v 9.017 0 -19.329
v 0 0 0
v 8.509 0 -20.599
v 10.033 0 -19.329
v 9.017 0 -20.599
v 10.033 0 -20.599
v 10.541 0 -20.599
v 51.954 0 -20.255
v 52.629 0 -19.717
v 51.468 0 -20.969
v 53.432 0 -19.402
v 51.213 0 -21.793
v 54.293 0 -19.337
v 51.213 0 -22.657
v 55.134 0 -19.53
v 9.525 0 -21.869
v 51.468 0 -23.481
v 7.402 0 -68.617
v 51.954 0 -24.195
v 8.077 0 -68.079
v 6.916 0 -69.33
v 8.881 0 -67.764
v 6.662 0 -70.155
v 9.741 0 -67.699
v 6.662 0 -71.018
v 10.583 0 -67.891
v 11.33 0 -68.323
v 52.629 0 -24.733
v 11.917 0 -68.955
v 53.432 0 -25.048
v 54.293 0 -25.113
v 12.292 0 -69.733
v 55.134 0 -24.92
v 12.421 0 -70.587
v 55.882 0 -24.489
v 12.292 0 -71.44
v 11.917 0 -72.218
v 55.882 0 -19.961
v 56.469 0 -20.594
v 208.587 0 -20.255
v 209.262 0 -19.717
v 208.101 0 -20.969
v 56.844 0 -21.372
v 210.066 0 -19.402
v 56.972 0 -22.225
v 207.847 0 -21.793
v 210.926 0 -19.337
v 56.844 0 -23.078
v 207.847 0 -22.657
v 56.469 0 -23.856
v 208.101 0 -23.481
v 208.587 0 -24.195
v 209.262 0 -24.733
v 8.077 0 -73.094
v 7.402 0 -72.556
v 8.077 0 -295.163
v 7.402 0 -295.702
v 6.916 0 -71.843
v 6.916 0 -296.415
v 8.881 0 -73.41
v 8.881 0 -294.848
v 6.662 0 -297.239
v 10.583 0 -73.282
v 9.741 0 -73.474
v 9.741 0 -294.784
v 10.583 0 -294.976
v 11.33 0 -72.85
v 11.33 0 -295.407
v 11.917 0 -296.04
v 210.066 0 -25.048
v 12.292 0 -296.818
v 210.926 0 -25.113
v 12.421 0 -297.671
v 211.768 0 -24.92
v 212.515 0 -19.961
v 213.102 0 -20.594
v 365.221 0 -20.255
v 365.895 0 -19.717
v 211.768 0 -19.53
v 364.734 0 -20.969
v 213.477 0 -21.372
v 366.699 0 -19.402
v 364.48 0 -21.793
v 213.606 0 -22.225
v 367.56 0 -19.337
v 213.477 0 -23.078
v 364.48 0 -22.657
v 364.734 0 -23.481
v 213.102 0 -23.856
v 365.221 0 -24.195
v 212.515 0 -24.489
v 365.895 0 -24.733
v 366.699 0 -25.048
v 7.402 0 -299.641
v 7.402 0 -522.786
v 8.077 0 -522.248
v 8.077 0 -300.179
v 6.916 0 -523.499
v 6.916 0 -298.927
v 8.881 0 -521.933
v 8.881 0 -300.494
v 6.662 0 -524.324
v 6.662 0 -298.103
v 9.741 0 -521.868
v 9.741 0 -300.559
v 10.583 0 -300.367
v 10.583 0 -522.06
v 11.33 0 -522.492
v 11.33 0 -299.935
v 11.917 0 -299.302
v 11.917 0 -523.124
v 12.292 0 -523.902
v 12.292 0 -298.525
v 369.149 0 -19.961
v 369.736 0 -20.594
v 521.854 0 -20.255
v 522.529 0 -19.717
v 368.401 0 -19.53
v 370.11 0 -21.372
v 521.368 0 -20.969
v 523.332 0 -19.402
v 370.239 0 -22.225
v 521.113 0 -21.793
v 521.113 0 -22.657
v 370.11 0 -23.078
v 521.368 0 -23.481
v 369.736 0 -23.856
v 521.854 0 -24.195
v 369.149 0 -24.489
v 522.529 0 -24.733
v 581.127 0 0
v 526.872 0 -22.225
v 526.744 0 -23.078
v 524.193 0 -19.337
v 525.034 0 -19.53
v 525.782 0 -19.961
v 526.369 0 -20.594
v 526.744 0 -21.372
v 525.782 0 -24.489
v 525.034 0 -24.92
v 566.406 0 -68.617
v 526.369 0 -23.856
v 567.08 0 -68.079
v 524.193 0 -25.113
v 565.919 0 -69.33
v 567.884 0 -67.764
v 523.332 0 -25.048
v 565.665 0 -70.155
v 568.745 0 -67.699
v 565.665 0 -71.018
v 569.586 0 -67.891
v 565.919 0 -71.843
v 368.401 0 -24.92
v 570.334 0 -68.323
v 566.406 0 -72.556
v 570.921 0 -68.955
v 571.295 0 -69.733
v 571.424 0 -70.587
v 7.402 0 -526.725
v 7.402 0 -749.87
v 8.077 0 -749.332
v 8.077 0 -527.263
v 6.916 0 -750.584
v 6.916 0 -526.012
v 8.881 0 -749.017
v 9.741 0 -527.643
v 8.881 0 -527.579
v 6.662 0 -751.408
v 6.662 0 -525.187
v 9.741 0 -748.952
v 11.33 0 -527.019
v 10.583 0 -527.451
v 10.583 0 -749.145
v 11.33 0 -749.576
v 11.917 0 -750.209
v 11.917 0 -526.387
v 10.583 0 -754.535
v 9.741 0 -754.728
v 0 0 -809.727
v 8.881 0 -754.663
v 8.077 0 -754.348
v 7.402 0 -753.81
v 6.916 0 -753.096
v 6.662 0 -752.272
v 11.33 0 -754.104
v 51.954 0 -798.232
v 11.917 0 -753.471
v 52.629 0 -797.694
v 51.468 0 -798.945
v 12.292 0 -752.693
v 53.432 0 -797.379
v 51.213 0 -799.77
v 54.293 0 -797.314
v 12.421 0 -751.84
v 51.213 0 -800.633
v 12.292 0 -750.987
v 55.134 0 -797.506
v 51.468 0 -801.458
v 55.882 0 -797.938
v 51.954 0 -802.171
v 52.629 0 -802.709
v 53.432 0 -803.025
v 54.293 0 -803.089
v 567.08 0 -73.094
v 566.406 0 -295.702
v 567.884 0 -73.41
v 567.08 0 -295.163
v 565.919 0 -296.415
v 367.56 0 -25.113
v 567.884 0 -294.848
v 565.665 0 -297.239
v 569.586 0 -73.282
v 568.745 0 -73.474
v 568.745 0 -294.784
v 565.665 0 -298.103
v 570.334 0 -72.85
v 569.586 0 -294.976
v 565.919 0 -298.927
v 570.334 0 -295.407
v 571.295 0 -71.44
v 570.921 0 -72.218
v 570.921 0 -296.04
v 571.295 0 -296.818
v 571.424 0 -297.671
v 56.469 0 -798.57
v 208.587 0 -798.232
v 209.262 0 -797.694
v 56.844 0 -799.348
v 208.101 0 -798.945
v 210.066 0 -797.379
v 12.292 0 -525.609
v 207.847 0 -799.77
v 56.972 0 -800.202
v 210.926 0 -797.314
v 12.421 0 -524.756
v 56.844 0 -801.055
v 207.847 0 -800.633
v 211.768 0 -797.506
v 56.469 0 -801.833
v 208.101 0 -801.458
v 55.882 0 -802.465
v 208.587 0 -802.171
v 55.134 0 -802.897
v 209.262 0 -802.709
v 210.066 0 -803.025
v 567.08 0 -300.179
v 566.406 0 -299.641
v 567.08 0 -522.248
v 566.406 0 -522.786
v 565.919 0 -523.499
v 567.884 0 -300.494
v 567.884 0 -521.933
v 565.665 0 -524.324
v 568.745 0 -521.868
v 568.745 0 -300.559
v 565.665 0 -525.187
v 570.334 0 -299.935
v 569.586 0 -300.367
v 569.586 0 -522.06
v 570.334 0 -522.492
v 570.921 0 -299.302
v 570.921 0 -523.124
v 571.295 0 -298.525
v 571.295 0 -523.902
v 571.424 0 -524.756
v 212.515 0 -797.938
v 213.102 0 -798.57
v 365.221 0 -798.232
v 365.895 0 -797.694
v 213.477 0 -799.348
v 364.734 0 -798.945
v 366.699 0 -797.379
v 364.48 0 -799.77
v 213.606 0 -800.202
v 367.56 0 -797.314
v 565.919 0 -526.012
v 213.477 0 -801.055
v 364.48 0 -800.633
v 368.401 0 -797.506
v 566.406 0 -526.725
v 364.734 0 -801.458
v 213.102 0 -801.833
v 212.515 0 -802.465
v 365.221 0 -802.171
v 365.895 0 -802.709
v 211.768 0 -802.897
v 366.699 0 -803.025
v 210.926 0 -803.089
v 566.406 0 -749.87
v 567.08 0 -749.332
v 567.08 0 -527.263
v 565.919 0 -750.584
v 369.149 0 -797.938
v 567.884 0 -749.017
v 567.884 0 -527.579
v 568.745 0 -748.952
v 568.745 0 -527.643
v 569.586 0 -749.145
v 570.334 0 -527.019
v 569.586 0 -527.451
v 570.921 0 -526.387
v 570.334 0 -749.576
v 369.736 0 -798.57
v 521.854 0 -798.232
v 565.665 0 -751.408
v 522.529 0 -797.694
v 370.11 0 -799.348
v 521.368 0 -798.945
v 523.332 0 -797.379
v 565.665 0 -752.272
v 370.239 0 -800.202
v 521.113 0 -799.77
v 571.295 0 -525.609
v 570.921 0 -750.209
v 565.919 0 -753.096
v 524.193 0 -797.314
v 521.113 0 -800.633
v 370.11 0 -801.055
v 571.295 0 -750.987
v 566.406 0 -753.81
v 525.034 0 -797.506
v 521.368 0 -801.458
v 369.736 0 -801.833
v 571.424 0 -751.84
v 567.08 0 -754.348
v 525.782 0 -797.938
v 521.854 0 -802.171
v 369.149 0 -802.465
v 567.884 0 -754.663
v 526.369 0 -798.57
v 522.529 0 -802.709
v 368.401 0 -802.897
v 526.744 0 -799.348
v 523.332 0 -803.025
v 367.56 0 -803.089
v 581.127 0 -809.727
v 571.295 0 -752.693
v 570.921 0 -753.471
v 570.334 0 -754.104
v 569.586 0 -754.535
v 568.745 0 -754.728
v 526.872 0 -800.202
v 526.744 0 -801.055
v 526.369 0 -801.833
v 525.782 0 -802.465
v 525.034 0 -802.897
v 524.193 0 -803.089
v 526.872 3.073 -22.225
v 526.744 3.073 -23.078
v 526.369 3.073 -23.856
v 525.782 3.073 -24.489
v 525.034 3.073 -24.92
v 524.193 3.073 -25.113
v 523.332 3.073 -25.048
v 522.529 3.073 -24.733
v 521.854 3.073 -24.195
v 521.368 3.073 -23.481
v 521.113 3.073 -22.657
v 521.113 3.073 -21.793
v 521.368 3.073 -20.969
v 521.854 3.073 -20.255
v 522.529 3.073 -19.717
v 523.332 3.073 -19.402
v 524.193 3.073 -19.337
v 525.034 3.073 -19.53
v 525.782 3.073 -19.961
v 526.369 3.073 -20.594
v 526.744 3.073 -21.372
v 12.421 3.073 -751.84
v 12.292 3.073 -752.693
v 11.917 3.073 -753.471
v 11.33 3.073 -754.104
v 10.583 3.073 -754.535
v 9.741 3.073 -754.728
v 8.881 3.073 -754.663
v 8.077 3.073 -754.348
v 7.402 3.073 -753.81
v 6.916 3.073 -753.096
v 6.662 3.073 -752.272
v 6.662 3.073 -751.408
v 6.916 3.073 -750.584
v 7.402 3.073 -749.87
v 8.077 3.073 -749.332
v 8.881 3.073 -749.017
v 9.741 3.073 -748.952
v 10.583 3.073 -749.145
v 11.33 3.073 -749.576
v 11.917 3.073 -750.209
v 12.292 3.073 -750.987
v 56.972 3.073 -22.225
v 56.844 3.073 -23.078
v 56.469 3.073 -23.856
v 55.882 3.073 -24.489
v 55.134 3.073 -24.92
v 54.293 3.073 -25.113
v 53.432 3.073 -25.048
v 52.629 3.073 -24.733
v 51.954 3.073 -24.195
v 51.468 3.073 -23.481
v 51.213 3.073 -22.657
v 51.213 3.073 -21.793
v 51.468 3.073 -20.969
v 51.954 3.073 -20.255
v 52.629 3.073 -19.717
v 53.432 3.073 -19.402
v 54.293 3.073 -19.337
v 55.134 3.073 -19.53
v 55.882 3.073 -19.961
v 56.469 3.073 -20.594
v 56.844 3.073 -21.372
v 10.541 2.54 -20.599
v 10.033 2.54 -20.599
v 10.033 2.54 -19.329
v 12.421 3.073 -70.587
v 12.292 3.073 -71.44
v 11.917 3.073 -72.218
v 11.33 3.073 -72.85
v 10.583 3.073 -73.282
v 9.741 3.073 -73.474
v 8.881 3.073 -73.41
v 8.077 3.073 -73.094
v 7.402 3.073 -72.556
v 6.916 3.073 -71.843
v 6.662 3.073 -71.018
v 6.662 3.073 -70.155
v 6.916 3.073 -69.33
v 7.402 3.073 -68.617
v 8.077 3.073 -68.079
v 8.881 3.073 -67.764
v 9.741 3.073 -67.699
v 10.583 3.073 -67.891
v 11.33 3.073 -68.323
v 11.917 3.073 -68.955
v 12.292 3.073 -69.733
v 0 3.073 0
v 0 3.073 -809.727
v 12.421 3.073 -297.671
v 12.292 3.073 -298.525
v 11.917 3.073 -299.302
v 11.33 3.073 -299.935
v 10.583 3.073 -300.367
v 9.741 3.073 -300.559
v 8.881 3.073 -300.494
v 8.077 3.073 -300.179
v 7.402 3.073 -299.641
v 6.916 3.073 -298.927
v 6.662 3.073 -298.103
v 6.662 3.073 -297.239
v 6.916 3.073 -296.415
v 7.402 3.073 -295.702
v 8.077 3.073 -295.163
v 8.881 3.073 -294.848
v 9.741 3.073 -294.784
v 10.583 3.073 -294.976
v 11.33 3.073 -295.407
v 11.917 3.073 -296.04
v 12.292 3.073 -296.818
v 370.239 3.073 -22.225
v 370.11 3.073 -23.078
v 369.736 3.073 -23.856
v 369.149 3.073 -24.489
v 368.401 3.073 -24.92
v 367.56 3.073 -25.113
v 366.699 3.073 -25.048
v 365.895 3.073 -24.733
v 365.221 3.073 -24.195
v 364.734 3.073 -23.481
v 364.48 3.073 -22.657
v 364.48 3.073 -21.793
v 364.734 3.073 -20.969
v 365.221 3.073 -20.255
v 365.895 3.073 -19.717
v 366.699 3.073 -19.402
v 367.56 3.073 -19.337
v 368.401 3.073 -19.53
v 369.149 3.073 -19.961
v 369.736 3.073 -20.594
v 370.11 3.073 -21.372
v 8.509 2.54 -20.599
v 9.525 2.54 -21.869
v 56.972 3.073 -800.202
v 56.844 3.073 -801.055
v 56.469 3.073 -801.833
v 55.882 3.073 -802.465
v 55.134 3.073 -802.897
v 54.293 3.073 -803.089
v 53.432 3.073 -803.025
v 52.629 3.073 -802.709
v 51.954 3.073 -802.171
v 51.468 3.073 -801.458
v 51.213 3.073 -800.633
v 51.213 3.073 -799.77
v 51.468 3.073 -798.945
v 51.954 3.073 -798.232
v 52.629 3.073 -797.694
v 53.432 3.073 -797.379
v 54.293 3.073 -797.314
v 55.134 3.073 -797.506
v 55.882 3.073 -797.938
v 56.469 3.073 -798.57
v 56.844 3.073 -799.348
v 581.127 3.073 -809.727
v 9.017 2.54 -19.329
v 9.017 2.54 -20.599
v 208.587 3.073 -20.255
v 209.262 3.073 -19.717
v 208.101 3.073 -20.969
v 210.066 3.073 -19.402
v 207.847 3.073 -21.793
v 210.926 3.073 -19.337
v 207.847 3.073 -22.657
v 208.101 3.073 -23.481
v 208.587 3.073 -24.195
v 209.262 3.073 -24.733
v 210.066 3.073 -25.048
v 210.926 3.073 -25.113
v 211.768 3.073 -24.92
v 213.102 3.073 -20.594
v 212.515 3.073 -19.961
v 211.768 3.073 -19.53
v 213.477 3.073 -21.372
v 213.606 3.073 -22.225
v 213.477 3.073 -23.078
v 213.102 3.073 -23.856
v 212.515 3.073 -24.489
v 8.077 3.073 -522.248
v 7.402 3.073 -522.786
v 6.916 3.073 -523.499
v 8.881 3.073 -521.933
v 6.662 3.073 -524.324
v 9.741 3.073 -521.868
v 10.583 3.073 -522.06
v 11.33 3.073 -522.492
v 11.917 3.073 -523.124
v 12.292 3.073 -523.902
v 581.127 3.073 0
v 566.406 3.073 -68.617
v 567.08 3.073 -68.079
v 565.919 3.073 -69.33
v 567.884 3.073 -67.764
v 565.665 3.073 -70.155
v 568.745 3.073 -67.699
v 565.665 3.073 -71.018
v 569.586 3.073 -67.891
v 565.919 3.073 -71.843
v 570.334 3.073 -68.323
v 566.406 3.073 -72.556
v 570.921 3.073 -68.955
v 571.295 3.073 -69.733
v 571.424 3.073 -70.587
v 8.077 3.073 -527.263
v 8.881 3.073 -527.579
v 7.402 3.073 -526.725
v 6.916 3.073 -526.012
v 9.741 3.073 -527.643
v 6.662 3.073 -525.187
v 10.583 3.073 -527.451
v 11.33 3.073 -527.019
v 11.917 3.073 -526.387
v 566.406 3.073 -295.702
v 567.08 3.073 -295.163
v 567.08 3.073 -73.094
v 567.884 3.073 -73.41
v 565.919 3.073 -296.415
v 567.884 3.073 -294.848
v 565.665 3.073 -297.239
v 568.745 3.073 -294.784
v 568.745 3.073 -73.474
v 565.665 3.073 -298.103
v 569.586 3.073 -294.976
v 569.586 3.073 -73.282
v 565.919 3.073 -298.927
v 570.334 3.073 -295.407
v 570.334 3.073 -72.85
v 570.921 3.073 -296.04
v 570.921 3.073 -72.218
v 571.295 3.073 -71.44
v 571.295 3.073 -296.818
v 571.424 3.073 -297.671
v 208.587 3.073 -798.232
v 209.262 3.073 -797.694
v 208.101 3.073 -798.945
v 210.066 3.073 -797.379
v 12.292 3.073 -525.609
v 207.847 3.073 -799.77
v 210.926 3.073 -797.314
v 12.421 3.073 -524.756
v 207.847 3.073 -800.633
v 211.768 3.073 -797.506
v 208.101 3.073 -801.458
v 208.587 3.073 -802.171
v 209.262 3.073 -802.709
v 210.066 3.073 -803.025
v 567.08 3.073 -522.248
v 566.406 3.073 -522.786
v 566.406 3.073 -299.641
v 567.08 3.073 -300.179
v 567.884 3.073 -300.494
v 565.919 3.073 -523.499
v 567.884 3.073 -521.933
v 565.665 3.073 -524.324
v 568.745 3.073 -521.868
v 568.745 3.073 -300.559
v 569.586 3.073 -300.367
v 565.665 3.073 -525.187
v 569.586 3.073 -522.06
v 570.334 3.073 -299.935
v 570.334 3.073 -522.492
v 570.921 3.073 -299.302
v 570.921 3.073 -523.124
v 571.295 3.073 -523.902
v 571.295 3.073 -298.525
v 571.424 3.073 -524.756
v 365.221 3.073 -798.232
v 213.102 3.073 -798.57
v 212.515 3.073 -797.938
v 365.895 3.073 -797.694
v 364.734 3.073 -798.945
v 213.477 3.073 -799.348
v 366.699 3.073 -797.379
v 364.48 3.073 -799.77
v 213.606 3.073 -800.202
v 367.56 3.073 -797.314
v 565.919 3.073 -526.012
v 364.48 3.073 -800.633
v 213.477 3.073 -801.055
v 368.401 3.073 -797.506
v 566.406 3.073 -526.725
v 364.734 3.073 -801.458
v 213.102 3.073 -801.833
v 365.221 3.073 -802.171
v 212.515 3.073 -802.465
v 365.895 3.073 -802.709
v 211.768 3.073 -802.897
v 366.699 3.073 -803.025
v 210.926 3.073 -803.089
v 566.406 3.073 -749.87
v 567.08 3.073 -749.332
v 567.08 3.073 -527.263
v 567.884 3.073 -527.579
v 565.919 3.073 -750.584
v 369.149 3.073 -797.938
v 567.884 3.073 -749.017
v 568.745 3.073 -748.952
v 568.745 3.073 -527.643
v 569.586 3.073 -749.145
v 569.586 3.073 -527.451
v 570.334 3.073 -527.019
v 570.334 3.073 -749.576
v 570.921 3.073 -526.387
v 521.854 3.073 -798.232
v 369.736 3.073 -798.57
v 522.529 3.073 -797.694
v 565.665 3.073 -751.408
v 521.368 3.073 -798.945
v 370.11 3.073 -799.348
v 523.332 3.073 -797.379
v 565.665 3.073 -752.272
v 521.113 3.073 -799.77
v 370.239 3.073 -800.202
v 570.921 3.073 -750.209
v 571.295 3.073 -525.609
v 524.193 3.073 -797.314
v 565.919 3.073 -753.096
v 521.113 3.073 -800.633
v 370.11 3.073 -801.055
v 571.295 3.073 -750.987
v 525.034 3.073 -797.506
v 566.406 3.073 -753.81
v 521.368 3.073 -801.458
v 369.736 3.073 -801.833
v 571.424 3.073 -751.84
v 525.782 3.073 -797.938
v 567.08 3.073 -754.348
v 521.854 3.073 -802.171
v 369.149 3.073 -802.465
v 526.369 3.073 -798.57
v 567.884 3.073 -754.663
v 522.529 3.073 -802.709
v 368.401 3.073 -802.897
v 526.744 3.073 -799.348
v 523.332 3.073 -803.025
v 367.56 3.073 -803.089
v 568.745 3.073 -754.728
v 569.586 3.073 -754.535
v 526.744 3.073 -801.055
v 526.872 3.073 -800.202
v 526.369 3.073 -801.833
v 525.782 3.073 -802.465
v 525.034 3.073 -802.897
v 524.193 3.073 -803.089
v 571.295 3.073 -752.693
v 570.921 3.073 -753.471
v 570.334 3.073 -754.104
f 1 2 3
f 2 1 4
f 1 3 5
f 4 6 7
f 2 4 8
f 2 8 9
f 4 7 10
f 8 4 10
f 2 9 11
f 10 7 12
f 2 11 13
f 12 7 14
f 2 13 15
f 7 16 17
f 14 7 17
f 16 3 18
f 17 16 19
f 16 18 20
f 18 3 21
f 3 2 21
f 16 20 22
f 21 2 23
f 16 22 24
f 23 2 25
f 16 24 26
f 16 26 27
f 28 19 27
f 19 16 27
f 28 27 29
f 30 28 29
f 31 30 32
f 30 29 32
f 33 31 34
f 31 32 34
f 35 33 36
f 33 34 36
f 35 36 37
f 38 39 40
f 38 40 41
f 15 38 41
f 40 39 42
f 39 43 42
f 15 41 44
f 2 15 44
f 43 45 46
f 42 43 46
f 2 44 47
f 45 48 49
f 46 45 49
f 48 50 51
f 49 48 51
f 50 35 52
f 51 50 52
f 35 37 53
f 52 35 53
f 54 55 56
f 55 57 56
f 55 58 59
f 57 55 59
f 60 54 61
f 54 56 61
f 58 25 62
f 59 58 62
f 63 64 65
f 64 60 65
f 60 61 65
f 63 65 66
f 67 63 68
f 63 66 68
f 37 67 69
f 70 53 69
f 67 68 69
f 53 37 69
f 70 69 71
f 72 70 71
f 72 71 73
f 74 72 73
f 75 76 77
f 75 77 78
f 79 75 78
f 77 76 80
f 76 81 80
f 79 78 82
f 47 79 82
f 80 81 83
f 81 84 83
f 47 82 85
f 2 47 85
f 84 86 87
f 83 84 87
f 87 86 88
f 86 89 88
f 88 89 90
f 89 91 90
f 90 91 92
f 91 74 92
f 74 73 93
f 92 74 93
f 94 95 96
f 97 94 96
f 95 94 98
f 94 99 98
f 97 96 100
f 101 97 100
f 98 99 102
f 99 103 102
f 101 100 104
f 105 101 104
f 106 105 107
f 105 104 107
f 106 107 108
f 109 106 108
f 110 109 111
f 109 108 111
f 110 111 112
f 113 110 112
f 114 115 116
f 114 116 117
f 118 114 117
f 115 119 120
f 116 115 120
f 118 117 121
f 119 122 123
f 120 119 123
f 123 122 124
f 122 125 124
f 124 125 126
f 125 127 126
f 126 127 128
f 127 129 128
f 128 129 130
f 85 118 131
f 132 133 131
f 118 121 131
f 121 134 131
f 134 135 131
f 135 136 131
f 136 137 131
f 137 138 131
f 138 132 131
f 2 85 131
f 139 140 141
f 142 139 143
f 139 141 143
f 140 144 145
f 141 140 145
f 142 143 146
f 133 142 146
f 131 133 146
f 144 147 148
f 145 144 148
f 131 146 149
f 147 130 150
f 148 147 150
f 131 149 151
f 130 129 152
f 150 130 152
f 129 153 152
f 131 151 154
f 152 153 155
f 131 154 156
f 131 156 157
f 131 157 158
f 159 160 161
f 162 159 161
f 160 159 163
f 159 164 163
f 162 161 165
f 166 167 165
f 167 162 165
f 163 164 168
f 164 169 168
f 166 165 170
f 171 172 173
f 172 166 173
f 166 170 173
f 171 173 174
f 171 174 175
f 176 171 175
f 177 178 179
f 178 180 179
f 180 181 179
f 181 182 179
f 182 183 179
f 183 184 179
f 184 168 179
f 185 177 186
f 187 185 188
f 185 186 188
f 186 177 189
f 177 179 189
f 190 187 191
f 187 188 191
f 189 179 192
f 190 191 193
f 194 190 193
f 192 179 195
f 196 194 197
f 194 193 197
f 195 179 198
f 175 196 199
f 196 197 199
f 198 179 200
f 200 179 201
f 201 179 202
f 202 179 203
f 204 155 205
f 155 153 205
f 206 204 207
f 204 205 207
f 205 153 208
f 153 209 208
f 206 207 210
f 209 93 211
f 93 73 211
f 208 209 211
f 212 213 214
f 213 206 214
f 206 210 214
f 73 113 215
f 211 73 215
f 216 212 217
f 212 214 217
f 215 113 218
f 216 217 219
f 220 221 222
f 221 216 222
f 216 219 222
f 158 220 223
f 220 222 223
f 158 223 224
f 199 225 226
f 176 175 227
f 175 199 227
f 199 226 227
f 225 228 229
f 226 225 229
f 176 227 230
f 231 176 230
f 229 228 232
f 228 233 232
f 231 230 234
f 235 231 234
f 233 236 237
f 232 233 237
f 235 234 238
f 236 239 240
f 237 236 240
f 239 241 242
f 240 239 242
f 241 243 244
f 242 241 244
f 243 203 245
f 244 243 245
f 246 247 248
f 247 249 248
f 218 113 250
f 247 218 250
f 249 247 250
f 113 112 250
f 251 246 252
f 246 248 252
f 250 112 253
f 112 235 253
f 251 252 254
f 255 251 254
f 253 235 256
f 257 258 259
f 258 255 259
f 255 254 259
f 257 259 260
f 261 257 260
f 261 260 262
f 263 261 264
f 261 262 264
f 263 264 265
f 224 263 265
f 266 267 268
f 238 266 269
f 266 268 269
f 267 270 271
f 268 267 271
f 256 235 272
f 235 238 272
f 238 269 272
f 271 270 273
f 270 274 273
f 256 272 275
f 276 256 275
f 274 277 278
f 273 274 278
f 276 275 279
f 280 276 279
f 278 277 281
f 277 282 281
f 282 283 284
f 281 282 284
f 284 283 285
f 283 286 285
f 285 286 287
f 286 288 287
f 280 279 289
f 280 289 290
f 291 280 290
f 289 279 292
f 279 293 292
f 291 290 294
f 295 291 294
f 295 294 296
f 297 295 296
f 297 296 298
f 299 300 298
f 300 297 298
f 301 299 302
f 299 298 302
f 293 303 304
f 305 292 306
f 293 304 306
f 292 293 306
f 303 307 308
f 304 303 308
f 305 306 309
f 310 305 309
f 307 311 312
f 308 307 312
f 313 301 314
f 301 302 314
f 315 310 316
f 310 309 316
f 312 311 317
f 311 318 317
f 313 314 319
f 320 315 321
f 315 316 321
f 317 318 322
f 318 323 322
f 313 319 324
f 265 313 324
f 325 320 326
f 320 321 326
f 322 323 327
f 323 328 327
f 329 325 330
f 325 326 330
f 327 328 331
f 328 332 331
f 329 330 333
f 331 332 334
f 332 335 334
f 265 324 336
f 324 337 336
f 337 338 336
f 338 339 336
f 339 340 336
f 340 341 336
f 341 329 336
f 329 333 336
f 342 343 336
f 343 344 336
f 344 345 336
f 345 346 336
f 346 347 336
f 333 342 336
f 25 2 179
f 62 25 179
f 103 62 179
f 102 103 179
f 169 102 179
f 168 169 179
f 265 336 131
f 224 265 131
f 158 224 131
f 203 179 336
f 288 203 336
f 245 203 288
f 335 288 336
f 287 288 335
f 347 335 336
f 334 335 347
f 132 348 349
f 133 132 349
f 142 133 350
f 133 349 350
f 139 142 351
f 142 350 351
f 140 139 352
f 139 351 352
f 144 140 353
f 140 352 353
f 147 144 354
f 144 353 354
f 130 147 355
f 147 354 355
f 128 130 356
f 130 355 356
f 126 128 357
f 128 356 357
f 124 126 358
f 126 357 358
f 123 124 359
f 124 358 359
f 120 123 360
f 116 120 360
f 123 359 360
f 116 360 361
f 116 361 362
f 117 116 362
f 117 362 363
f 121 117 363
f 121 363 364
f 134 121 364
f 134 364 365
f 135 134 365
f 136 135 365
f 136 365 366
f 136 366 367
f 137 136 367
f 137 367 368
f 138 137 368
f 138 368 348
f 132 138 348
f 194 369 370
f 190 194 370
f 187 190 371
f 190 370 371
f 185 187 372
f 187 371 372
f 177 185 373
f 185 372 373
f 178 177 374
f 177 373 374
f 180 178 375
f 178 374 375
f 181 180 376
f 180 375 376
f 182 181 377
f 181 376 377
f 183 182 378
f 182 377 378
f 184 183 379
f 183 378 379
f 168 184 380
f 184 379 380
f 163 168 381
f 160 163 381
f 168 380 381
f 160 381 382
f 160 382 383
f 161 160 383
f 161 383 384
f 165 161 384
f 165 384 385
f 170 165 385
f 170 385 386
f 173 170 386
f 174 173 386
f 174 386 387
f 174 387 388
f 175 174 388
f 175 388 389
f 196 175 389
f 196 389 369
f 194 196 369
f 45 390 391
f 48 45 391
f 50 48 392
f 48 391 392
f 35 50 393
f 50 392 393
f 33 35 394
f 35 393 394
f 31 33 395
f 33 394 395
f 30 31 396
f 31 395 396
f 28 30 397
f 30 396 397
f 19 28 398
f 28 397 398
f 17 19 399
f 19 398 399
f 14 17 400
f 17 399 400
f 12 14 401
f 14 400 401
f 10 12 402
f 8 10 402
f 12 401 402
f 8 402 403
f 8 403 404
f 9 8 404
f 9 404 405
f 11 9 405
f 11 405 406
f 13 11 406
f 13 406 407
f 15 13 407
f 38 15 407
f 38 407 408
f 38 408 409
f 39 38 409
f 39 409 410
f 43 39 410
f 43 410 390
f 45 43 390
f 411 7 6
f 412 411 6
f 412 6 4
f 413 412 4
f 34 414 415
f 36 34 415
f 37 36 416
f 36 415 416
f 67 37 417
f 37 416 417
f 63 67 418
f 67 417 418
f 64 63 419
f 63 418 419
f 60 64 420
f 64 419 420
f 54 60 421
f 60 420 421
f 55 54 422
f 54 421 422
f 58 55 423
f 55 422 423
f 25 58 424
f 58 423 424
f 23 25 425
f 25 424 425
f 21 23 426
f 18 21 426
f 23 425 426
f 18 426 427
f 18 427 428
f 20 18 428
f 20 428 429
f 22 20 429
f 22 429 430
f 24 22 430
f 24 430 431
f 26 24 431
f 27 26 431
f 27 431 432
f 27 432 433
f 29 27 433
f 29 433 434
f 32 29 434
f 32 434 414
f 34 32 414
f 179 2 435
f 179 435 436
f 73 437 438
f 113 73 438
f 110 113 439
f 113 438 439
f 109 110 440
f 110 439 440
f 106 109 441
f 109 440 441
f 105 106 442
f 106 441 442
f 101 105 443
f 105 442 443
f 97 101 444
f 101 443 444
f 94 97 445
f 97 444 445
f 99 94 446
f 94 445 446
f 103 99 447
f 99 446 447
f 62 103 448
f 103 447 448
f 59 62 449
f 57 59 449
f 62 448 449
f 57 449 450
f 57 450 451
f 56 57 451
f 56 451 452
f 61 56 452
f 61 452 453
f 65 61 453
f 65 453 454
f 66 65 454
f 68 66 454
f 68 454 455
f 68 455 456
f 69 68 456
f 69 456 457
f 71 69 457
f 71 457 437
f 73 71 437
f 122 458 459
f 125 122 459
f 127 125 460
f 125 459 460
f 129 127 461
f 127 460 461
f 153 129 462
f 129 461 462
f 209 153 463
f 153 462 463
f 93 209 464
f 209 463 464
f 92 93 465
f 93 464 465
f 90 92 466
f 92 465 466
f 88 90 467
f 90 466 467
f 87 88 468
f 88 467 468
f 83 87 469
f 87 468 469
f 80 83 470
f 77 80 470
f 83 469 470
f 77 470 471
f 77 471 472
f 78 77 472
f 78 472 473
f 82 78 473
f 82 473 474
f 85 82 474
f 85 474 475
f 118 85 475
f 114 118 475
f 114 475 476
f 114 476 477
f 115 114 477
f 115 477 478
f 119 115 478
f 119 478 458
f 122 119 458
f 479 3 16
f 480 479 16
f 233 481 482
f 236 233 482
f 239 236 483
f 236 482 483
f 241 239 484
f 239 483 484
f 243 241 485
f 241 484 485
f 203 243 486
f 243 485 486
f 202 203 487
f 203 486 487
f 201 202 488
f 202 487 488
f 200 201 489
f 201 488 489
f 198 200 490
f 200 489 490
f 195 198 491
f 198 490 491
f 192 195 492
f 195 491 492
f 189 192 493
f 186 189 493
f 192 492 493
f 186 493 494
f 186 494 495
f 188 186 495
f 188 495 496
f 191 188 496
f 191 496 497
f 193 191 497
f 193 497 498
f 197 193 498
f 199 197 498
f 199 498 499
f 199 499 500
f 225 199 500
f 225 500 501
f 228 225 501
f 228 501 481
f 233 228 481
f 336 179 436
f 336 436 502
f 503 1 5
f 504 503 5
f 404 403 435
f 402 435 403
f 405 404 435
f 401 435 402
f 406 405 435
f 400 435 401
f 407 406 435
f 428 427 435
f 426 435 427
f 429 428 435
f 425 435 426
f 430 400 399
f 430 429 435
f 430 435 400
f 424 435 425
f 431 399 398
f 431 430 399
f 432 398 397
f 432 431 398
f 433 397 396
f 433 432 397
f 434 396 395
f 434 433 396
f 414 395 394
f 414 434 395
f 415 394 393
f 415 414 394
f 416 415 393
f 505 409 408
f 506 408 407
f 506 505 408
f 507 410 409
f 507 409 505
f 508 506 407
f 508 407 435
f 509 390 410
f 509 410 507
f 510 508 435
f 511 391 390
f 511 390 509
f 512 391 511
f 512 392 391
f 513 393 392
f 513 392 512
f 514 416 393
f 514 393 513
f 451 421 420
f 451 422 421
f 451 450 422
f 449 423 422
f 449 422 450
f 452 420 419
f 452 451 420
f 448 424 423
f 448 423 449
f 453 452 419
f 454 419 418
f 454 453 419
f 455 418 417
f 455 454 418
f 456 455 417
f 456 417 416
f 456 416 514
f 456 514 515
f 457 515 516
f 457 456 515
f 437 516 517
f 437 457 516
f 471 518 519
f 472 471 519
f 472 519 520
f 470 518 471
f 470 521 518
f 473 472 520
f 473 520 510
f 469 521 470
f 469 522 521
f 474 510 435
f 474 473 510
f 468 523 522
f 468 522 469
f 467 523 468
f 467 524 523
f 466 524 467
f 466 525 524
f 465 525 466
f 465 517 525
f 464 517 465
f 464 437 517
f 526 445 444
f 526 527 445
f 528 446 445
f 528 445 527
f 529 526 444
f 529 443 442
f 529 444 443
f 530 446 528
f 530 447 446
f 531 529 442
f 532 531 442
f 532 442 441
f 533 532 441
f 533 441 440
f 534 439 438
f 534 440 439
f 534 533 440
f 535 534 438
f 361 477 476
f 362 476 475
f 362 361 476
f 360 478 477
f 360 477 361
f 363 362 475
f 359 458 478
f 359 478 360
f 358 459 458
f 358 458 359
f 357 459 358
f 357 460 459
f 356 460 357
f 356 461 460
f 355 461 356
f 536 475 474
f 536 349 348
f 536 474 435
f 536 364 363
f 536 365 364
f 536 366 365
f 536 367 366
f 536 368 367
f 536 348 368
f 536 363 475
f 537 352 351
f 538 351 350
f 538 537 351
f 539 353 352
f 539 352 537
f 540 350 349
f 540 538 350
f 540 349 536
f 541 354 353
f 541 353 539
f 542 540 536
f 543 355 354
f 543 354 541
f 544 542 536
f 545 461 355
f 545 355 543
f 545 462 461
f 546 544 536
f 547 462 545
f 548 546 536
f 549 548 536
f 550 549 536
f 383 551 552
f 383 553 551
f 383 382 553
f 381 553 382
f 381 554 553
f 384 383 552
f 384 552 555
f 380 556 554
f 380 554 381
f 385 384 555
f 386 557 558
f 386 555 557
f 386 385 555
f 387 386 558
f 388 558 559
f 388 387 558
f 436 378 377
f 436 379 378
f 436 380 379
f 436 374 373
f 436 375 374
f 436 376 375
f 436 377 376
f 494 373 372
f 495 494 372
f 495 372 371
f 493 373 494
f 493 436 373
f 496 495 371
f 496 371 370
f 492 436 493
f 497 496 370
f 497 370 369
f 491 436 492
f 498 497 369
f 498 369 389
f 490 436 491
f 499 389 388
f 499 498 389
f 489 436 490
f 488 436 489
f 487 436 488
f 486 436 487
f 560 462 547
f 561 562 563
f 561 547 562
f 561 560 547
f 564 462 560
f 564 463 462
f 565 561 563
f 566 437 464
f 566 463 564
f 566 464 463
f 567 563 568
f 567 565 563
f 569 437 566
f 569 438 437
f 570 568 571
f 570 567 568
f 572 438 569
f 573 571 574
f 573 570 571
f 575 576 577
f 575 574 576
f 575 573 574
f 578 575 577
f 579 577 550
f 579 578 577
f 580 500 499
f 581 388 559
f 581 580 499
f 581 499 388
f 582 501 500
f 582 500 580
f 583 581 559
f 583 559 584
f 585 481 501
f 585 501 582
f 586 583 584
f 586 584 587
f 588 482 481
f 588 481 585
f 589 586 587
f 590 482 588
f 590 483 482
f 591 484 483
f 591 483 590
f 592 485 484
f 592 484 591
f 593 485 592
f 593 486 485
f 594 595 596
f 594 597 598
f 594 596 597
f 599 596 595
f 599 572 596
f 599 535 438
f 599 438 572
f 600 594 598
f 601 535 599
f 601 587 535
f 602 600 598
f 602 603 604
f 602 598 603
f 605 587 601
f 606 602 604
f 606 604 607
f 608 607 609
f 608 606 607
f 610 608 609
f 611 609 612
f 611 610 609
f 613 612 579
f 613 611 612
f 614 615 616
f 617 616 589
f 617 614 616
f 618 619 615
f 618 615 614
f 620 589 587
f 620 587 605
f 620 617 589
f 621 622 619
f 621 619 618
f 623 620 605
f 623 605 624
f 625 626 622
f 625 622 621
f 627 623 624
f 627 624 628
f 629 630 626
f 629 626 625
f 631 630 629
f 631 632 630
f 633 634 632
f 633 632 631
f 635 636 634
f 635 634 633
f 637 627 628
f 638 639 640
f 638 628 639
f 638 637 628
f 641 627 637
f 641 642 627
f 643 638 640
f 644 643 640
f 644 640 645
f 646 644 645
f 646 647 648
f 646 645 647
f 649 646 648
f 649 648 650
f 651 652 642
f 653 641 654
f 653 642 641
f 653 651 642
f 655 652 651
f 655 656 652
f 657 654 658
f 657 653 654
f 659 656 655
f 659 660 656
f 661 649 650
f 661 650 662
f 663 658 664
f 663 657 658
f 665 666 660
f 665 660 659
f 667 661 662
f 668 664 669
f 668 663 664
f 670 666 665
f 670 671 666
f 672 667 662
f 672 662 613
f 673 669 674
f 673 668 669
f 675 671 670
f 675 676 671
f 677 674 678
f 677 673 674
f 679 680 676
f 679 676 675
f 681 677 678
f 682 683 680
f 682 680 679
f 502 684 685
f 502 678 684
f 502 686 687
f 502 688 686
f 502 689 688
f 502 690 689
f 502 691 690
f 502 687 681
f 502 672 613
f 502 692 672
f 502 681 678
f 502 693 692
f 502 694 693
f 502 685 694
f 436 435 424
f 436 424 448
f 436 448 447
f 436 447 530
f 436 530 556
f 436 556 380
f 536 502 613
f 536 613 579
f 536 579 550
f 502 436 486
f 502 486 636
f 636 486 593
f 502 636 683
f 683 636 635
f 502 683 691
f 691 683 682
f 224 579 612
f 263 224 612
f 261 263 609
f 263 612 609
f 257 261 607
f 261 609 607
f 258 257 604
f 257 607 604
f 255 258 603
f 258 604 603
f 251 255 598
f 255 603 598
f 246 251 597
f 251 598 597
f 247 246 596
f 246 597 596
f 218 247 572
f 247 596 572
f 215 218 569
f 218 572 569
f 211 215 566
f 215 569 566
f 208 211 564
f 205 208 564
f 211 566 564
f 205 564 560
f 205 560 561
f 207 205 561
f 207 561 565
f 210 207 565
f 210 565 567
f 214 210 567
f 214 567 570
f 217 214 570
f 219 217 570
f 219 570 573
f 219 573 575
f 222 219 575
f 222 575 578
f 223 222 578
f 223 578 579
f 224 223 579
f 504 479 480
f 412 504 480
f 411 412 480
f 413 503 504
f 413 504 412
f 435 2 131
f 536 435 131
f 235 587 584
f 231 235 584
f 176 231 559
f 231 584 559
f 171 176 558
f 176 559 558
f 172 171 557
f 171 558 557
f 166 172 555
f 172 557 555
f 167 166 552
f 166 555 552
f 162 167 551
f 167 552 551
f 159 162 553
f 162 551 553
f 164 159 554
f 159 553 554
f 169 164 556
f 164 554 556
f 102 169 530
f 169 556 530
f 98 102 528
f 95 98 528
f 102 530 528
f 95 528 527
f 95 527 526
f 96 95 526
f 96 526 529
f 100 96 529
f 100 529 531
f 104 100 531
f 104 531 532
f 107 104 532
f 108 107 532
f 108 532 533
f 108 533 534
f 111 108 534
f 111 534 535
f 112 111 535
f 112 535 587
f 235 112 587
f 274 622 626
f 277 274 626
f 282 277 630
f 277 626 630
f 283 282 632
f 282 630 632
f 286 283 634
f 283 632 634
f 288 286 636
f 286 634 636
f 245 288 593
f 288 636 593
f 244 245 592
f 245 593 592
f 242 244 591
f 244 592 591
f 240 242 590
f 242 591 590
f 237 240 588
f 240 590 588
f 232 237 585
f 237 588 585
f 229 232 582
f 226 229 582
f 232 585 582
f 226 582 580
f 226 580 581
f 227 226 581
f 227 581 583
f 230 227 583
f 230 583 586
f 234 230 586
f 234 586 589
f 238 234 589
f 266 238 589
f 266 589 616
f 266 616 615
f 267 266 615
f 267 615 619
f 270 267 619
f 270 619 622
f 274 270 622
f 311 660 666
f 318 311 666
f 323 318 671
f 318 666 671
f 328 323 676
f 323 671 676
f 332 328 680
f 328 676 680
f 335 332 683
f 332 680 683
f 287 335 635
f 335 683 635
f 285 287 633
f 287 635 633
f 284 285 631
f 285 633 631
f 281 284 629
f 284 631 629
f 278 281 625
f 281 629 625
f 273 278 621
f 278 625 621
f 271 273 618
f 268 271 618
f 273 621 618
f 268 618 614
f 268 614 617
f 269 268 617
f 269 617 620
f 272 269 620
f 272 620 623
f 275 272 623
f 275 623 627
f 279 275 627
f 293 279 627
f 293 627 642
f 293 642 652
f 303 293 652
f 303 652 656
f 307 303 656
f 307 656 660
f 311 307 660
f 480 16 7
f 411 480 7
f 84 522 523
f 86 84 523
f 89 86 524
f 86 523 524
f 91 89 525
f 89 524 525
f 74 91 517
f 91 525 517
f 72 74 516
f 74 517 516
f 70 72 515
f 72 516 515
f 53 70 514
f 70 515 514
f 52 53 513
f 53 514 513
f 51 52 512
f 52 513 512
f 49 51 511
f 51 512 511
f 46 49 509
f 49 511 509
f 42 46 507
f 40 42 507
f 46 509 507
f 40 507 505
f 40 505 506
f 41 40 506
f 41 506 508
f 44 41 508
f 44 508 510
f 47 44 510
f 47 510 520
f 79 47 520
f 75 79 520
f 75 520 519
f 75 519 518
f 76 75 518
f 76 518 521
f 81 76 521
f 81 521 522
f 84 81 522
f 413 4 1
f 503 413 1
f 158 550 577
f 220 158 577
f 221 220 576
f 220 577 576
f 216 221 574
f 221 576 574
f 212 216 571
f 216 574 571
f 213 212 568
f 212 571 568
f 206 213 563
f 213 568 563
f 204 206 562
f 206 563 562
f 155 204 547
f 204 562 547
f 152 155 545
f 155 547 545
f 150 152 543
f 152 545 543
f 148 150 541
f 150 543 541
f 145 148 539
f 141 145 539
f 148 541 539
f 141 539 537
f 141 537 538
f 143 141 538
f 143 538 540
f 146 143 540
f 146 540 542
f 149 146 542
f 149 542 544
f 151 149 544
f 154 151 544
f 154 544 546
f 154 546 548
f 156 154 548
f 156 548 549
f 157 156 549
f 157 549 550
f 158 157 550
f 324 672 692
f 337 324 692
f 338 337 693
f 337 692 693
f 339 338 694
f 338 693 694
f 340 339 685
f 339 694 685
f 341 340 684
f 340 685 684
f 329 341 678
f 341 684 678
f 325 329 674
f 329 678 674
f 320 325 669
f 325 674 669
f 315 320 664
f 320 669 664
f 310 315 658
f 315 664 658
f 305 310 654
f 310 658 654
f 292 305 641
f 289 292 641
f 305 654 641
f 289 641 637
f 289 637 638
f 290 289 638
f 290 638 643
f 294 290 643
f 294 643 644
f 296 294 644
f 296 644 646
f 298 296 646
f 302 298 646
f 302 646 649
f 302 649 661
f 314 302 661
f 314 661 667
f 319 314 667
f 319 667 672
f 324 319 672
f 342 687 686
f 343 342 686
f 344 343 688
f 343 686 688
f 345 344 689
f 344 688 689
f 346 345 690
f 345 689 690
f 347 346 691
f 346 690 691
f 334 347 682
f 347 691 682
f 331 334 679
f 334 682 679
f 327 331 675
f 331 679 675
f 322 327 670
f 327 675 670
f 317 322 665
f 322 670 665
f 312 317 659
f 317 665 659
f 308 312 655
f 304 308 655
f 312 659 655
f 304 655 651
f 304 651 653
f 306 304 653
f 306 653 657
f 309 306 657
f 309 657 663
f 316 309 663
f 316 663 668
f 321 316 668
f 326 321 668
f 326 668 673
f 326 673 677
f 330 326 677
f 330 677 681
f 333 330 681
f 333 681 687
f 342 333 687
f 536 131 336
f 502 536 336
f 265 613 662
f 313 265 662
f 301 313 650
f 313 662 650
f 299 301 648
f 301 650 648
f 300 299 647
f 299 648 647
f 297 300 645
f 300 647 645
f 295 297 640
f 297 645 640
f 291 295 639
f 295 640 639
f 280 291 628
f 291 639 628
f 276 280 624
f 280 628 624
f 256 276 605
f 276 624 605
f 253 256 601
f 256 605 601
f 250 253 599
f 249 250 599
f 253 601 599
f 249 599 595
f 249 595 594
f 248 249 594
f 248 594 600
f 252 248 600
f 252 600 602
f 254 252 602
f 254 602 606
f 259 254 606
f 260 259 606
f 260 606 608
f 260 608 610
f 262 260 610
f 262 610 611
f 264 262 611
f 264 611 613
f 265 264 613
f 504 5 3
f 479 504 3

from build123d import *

# Parameters (mm, degrees)
SKETCH1_W            = 581.1266
SKETCH1_H            = 809.7266
REARSHEET_DEPTH      = 3.0734
SKETCH2_R            = 2.8956
TOPBOTTOMHOLES_DEPTH = 4.0734
SKETCH3_R            = 2.8956
VERTHOLES_DEPTH      = 4.0734
LPATTERN1_COUNT      = 4
LPATTERN1_PITCH      = 156.633333333
LPATTERN2_COUNT      = 4
LPATTERN2_PITCH      = 227.084466667
CUT_EXTRUDE1_DEPTH   = 2.54


with BuildPart() as part:
    # Sketch1 → RearSheet (new body)
    with BuildSketch(Plane(origin=(0, 0, 0), x_dir=(1, 0, 0), z_dir=(0, 1, 0))):
        with Locations((290.5633, 404.8633)):
            Rectangle(SKETCH1_W, SKETCH1_H)
    extrude(amount=REARSHEET_DEPTH)

    # Sketch2 → TopBottomHoles (cut, through all)
    with BuildSketch(Plane(origin=(0, 3.0734, 0), x_dir=(1, 0, 0), z_dir=(0, 1, 0))):
        with Locations((54.0766, 800.2016)):
            Circle(SKETCH2_R)
        with Locations((54.0766, 22.225)):
            Circle(SKETCH2_R)
    topbottomholes = extrude(amount=-TOPBOTTOMHOLES_DEPTH, mode=Mode.SUBTRACT)

    # Sketch3 → VertHoles (cut, through all)
    with BuildSketch(Plane(origin=(0, 3.0734, 0), x_dir=(1, 0, 0), z_dir=(0, 1, 0))):
        with Locations((9.525, 751.84)):
            Circle(SKETCH3_R)
        with Locations((568.5282, 751.84)):
            Circle(SKETCH3_R)
    vertholes = extrude(amount=-VERTHOLES_DEPTH, mode=Mode.SUBTRACT)

    # LPattern1: TopBottomHoles ×4
    with Locations(*[(i * LPATTERN1_PITCH, 0, 0) for i in range(1, LPATTERN1_COUNT)]):
        add(topbottomholes, mode=Mode.SUBTRACT)

    # LPattern2: VertHoles ×4
    with Locations(*[(0, 0, i * LPATTERN2_PITCH) for i in range(1, LPATTERN2_COUNT)]):
        add(vertholes, mode=Mode.SUBTRACT)

    # Sketch4 → Cut-Extrude1 (cut)
    with BuildSketch(Plane.XZ):
        Polygon((10.033, -19.3294), (9.017, -19.3294), (9.017, -20.5994), (8.509, -20.5994), (9.525, -21.8694), (10.541, -20.5994), (10.033, -20.5994), align=None)
    extrude(amount=-CUT_EXTRUDE1_DEPTH, mode=Mode.SUBTRACT)


solid = part.part
